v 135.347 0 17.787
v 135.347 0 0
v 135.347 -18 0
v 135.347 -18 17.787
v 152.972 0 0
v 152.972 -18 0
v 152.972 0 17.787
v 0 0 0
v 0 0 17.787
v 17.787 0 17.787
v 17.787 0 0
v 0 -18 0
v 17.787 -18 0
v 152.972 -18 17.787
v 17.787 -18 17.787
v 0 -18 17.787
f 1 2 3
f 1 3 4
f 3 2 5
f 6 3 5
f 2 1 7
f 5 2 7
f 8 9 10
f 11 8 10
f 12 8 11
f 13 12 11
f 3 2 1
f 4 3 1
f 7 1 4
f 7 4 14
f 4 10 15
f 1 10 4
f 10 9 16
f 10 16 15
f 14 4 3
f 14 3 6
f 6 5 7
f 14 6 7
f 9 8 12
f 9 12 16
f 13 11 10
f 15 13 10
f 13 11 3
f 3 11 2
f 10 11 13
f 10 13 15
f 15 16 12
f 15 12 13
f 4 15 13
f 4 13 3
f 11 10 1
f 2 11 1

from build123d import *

# Parameters (mm, degrees)
F0_W     = 17.787475
F0_H     = 17.787475
F0_W_2   = 17.625764
F1_DEPTH = 18
F0_W_3   = 117.559042
F2_DEPTH = 18


with BuildPart() as f1:
    # F0 (on Front) → F1 (new body)
    with BuildSketch(Plane.XZ):
        with Locations((8.893738, 8.893738)):
            Rectangle(F0_W, F0_H)
        with Locations((144.159399, 8.893738)):
            Rectangle(F0_W_2, F0_H)
    extrude(amount=F1_DEPTH)


with BuildPart() as f2:
    # F0 (on Front) → F2 (new body)
    with BuildSketch(Plane.XZ):
        with Locations((76.566996, 8.893738)):
            Rectangle(F0_W_3, F0_H)
    extrude(amount=F2_DEPTH)


solid = Compound([f1.part, f2.part])
